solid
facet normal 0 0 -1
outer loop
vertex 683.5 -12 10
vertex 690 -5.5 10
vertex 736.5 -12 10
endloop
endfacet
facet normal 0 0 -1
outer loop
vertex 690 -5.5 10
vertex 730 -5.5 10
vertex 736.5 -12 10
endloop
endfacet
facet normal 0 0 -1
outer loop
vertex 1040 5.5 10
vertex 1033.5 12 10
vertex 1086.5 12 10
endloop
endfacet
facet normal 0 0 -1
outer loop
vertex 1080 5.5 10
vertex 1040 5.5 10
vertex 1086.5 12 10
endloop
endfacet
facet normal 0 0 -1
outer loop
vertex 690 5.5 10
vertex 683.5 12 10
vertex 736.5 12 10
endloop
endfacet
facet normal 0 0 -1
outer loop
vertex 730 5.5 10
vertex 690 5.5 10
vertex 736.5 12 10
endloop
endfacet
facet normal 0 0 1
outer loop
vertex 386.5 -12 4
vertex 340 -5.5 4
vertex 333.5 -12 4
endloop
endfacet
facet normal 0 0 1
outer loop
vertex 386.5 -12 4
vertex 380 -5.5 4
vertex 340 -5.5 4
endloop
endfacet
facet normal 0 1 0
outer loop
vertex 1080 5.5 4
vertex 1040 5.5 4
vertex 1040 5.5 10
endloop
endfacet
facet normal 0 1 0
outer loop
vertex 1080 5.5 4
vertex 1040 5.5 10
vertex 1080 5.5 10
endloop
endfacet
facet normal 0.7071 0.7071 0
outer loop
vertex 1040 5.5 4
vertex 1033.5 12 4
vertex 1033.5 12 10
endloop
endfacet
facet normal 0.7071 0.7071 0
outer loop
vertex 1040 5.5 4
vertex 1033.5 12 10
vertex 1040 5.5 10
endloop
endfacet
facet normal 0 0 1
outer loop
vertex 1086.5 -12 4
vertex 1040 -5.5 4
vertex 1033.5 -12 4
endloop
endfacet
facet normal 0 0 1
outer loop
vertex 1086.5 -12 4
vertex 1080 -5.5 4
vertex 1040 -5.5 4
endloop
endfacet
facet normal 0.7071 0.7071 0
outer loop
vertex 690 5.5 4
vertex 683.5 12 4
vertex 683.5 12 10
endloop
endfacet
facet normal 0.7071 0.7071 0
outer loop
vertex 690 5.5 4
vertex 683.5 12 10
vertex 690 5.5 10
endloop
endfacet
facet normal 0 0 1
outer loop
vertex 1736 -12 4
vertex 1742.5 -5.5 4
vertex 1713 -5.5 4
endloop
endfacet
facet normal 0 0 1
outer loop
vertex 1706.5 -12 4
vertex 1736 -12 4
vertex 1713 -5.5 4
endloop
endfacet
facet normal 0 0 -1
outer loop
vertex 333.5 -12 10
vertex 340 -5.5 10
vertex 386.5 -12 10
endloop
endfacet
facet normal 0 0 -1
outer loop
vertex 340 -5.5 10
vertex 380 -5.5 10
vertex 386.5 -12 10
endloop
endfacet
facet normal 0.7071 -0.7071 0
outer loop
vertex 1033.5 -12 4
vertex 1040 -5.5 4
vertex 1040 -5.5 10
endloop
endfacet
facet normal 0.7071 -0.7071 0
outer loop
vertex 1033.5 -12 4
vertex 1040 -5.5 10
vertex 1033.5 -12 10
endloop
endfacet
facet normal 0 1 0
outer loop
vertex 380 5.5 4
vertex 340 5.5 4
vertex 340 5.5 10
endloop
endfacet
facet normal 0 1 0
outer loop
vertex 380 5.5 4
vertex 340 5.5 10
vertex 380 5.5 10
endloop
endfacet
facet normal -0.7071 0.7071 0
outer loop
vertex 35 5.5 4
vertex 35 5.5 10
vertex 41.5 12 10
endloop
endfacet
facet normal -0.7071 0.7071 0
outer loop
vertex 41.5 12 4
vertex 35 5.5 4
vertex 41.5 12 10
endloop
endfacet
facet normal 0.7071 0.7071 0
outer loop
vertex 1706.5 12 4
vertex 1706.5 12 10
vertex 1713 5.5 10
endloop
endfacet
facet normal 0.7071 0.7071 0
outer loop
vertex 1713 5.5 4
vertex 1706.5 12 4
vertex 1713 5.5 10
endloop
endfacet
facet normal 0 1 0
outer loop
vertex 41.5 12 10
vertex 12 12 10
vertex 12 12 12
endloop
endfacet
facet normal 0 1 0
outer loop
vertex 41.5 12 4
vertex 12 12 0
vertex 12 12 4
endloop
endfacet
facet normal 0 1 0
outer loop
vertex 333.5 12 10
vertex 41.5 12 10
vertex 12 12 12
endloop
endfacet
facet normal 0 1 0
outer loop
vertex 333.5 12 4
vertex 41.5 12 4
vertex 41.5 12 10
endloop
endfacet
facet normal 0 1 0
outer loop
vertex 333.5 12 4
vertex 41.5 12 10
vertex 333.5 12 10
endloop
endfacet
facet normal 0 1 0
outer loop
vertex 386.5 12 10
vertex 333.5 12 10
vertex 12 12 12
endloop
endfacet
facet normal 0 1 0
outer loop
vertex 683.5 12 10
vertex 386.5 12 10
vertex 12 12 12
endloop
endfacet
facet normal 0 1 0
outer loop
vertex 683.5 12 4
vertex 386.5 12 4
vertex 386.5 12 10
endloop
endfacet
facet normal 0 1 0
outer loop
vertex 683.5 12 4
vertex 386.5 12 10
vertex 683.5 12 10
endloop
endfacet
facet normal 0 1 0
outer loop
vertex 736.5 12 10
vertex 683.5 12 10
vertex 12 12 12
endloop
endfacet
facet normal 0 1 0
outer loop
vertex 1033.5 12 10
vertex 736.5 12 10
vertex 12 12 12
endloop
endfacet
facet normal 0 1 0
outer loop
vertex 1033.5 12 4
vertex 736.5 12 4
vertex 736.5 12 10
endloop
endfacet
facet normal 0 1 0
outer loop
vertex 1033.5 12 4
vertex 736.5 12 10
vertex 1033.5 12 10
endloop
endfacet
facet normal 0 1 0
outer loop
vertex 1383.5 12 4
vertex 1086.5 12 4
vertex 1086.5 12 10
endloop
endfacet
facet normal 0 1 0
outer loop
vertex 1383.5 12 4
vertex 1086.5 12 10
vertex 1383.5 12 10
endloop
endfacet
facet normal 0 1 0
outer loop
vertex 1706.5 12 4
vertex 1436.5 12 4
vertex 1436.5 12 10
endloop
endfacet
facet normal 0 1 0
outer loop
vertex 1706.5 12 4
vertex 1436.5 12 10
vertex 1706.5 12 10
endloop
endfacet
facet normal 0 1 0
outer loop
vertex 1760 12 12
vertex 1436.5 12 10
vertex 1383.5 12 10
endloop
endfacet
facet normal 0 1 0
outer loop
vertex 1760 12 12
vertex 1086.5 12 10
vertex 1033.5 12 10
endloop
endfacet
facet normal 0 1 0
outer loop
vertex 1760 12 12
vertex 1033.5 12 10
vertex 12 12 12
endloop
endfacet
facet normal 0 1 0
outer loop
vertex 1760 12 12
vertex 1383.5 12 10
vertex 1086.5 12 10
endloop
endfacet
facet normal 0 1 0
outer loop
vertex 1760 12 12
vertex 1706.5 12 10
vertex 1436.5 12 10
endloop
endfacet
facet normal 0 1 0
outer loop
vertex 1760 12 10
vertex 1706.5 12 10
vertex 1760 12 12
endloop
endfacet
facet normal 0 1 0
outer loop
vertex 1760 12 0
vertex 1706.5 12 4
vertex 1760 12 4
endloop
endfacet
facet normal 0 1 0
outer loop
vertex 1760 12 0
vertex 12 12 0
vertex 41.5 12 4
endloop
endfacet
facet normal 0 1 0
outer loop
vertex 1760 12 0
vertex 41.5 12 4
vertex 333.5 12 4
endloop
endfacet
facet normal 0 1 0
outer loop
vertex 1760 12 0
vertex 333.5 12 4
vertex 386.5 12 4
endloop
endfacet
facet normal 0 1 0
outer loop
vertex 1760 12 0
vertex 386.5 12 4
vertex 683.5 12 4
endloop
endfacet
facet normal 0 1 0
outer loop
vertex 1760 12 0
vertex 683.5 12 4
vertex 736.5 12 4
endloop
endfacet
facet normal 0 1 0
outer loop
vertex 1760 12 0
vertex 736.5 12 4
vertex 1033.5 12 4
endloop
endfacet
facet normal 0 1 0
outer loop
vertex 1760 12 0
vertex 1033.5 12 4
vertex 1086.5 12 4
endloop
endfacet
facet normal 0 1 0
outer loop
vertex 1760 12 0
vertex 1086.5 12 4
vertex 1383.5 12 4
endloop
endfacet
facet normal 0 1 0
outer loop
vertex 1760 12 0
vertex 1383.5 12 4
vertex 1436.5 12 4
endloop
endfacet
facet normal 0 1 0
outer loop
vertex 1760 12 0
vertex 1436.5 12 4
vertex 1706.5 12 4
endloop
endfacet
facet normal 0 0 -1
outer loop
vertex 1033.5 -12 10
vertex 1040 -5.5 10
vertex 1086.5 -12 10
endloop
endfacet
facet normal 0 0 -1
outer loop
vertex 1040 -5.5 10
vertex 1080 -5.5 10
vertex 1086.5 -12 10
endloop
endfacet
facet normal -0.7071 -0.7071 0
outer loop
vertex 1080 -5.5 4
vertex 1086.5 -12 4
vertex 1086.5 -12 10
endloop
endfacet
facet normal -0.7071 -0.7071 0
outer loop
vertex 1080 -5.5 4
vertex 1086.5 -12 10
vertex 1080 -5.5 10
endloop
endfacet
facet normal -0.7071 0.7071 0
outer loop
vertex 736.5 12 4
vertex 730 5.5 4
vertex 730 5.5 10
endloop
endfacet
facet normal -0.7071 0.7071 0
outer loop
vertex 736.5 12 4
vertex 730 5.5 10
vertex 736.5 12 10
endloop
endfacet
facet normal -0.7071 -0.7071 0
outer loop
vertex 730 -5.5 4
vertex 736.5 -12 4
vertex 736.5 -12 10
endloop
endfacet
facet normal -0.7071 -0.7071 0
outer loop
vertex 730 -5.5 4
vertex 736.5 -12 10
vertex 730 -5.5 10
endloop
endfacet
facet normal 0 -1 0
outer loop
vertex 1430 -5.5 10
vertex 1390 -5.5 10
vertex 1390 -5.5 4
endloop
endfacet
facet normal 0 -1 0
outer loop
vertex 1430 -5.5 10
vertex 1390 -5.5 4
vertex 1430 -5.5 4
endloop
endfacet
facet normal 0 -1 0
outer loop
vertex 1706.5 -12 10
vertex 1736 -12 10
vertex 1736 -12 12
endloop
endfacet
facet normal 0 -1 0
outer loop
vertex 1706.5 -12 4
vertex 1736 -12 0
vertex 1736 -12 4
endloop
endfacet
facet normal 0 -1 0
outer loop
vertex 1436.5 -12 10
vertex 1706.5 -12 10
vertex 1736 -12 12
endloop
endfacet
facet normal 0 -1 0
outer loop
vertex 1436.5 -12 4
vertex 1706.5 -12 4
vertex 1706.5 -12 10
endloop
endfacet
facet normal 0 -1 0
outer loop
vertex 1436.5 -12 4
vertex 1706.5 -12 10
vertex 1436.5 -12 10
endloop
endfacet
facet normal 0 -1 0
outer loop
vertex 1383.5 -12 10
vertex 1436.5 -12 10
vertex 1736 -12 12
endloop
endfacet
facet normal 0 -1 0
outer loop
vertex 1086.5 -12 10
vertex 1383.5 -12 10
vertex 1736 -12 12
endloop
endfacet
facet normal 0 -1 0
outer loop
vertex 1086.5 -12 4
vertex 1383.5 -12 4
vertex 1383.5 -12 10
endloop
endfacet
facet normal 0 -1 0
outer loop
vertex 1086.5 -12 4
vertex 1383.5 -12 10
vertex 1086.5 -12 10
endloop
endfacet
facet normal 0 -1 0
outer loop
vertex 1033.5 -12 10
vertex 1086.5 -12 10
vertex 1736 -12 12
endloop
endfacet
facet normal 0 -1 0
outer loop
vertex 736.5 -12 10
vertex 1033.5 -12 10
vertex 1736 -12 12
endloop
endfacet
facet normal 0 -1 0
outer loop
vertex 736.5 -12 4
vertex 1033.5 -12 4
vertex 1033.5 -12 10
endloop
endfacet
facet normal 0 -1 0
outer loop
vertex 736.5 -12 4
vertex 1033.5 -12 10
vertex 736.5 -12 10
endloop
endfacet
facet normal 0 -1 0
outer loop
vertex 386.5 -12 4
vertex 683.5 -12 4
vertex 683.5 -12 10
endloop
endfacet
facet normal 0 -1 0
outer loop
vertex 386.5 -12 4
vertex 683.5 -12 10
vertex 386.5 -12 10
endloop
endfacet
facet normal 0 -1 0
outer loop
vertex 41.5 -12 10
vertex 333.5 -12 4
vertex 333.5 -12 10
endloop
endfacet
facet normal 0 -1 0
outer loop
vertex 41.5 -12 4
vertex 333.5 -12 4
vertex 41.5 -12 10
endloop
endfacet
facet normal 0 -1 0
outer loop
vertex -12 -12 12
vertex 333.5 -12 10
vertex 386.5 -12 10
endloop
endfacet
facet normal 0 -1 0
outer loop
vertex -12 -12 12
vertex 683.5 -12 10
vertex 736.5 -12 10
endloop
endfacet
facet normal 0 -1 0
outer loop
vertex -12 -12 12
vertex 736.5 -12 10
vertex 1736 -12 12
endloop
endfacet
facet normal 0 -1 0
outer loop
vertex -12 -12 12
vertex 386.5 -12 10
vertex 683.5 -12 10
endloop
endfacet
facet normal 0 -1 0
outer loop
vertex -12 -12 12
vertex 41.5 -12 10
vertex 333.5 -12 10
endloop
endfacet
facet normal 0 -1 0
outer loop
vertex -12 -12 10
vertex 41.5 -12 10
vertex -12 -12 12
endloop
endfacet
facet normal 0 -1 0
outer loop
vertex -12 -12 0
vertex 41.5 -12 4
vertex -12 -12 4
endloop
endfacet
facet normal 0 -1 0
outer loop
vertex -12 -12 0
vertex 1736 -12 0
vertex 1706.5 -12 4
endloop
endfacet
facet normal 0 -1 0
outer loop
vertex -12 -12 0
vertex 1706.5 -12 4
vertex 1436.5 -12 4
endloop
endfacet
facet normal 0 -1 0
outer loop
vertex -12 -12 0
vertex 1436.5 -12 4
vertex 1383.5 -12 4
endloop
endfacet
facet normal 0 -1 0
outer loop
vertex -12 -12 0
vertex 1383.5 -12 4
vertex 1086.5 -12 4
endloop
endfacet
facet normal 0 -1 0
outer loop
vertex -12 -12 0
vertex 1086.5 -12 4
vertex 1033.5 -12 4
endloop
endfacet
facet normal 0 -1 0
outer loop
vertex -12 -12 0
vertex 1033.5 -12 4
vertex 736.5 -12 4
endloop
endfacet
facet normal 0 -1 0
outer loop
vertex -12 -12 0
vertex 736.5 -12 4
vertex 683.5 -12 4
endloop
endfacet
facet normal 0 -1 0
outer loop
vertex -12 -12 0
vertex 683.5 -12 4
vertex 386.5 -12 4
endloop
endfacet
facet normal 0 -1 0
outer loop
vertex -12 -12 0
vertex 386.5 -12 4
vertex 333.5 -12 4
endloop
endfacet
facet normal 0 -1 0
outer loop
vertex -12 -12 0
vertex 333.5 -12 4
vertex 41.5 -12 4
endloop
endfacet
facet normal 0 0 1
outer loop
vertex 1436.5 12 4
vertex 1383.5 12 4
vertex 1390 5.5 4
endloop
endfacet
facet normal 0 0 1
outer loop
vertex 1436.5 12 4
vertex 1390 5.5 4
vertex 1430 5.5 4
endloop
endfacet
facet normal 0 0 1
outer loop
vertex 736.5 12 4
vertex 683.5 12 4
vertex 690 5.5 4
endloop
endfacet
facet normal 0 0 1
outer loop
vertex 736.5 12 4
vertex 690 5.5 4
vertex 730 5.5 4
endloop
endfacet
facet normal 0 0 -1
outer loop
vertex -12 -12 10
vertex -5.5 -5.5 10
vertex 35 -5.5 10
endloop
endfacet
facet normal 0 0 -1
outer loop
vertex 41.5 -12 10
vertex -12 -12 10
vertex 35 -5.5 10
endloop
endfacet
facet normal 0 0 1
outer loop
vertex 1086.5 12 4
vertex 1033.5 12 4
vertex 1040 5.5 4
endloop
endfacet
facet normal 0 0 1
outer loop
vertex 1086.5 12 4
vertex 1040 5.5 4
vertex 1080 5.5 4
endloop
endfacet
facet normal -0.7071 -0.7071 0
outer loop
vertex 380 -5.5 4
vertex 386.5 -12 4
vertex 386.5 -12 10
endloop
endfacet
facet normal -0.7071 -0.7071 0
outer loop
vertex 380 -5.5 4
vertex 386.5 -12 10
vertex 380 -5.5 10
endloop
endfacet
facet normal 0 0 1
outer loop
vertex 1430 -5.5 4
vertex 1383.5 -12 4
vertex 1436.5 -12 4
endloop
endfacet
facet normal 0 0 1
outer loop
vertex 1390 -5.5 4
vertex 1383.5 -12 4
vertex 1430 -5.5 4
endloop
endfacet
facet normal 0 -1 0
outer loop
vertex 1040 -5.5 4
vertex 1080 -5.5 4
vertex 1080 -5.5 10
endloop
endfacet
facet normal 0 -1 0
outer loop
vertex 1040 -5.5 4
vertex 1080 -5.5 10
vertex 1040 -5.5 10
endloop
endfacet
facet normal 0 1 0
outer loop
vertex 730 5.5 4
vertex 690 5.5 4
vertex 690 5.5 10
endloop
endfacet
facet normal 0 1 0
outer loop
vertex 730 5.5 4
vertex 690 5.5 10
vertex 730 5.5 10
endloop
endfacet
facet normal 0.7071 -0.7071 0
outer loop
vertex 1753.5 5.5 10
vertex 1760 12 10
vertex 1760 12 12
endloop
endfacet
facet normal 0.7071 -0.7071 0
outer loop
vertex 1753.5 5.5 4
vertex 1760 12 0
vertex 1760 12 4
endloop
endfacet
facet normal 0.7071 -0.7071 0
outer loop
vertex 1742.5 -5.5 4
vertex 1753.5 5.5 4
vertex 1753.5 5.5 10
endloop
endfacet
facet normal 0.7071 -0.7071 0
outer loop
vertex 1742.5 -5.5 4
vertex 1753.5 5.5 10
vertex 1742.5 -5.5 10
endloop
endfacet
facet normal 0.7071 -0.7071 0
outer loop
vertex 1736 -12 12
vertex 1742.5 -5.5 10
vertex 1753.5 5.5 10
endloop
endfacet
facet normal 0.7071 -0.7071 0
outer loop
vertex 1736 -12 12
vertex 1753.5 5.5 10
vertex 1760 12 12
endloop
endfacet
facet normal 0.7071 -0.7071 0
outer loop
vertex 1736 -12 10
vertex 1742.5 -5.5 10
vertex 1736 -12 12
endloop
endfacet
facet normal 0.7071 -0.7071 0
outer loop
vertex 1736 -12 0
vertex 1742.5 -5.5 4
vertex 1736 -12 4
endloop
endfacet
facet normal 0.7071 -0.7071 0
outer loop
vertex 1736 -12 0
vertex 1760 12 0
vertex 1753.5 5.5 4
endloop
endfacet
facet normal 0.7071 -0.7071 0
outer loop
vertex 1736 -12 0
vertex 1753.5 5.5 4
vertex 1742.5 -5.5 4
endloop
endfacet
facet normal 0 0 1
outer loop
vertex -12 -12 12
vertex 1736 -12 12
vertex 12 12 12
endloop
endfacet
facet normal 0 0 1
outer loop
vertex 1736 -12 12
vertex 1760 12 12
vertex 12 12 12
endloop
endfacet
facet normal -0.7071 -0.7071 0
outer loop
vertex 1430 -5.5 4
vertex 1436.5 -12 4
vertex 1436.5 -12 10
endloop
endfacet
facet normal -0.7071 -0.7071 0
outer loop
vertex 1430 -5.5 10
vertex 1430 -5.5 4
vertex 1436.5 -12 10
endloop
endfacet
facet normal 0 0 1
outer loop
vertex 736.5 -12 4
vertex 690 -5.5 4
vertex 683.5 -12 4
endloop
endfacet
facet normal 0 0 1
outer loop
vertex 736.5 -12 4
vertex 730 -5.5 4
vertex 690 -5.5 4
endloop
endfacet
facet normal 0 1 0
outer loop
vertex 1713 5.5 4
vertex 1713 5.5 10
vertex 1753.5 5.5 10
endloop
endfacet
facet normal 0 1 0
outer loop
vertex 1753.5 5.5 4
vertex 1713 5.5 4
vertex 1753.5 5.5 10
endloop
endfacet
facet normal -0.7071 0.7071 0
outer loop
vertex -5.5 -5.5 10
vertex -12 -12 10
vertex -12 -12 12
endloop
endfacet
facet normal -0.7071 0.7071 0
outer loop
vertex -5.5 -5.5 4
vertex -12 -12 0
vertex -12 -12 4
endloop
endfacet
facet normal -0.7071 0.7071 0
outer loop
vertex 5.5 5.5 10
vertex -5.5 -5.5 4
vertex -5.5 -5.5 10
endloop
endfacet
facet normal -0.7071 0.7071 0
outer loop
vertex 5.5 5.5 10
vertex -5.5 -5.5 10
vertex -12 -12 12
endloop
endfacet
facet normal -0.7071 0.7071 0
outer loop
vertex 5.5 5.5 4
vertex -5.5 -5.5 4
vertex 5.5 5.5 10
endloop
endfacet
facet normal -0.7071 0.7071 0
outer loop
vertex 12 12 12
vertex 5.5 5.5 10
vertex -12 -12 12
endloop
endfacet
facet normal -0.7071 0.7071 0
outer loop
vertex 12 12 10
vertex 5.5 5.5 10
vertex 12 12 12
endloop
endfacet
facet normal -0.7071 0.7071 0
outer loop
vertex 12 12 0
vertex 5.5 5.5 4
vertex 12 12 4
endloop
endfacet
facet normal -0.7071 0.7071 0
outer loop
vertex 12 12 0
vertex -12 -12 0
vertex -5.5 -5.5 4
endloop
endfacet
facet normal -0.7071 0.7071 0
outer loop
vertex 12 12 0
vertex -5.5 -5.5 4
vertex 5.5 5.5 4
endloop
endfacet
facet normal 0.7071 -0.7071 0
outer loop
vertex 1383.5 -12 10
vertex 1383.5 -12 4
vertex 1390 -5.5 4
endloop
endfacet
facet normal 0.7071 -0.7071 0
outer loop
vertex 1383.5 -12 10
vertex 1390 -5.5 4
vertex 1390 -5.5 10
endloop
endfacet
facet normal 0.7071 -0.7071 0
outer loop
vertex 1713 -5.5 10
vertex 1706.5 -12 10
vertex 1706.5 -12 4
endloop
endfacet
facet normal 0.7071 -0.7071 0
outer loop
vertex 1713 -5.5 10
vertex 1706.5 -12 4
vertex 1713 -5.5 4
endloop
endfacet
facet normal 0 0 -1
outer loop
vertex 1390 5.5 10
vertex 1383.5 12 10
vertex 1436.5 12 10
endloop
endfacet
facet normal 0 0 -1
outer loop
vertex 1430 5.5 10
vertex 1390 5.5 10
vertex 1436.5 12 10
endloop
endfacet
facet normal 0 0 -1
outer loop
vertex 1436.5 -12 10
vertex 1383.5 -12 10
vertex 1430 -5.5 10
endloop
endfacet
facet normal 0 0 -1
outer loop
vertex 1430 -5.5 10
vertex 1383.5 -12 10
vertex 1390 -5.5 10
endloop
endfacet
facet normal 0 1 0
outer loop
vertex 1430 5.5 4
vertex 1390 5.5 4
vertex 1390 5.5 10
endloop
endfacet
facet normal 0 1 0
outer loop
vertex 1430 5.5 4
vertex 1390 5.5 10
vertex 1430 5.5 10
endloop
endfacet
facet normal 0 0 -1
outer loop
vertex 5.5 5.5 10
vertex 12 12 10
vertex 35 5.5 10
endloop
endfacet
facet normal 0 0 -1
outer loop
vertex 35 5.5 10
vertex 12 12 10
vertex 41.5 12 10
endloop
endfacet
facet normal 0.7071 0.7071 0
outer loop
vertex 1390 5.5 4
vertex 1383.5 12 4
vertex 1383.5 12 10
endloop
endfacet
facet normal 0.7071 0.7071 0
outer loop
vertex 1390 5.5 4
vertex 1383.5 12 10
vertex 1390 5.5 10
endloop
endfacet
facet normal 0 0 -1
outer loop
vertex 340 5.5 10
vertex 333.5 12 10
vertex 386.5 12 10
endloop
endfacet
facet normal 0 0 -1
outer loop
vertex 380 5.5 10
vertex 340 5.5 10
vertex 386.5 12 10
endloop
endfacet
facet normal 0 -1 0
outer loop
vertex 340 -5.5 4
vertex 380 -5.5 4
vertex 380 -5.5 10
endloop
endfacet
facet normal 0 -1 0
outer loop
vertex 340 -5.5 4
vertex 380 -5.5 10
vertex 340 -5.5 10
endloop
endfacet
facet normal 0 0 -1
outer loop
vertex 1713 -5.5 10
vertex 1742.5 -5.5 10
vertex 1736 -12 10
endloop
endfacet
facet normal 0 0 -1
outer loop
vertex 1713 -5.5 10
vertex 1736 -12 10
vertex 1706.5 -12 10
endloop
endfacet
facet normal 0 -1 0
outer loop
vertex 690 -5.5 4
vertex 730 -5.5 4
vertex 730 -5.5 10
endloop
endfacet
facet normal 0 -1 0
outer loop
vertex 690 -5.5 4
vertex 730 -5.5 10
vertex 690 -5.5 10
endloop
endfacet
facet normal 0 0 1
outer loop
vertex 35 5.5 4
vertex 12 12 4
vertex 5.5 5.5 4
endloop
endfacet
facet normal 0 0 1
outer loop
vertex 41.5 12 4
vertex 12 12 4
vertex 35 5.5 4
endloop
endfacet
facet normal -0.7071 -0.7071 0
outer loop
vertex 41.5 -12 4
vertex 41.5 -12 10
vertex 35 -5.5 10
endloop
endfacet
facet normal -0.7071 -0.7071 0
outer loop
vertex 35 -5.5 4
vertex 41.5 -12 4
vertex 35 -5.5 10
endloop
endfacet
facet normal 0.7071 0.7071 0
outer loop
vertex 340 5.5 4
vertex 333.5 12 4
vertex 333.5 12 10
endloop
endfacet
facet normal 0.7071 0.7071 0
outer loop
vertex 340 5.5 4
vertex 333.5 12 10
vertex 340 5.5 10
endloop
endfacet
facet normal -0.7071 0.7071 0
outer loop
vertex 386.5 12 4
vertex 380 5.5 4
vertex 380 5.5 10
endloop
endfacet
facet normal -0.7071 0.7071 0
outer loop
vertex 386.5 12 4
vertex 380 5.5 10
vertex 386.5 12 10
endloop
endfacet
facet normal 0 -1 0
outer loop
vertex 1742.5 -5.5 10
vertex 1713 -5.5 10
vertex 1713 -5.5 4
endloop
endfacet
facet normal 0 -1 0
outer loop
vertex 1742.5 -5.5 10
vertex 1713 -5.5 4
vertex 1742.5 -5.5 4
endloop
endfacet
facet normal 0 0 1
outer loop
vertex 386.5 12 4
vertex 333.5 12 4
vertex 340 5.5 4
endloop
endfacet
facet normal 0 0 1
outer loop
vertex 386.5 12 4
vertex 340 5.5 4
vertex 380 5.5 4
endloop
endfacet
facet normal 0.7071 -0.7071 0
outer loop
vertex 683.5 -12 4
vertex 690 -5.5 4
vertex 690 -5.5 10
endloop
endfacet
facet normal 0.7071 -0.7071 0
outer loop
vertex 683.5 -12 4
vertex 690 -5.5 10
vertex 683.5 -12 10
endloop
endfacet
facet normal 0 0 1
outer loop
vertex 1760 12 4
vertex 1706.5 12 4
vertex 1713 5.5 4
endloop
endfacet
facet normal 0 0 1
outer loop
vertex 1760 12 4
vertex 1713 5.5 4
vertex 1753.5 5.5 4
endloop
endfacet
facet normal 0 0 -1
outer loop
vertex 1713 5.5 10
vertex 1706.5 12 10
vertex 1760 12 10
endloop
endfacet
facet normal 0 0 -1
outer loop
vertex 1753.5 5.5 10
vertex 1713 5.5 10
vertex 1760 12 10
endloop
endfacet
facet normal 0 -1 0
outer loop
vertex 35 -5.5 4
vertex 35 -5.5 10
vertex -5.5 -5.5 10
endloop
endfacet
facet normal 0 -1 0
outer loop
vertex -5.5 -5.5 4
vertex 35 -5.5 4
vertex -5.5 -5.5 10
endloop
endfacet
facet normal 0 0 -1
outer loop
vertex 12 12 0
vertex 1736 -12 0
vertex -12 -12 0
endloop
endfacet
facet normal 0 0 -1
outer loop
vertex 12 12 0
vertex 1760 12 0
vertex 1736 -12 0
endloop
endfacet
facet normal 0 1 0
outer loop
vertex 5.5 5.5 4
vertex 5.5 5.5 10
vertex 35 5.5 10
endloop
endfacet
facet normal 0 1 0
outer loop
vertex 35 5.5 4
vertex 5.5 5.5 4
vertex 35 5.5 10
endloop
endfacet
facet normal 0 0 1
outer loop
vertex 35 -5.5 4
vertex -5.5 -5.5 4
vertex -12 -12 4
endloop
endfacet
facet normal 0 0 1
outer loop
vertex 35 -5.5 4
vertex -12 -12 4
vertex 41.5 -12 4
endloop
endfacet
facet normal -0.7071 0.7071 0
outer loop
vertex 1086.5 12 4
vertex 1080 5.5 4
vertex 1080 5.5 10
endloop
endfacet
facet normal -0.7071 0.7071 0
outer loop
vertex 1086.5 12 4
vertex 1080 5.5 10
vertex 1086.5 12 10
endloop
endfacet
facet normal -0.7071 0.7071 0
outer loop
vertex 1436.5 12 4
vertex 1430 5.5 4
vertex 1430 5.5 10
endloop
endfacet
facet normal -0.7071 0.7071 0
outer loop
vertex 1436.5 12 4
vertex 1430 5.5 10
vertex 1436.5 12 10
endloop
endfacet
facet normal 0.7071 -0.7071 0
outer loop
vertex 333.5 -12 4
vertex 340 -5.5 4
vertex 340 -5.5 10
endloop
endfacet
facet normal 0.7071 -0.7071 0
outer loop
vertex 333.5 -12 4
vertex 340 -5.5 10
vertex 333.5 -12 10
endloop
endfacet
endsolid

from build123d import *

# Parameters (mm, degrees)
EXTRUDE_1_DEPTH        = 12
SKETCH_2_W             = 40
SKETCH_2_H             = 6
CUT_EXTRUDE_1_DEPTH    = 6.5
DRAFT_1_ANGLE          = 45
MIRROR_START           = 4
MIRROR_1_DEPTH         = 6
PATTERN_START          = 4
PATTERN_LINEAR_2_DEPTH = 6
CUT_EXTRUDE_START      = -2
CUT_EXTRUDE_2_DEPTH    = 6


# Read off the part's stored shape, not the designer's step: 镜向1, 阵列(线性)2
with BuildPart() as part:
    # 草图1 → 凸台-拉伸1 (new body)
    with BuildSketch(Plane.XY):
        Polygon((-12, -12), (12, 12), (1760, 12), (1736, -12), align=None)
    extrude(amount=EXTRUDE_1_DEPTH)

    # 草图2 → 切除-拉伸1 (cut)
    with BuildSketch(Plane.XZ.offset(12)):
        with Locations((1410, 7)):
            Rectangle(SKETCH_2_W, SKETCH_2_H)
    extrude(amount=-CUT_EXTRUDE_1_DEPTH, mode=Mode.SUBTRACT)

    # 拔模1
    draft_1_faces = [part.faces().sort_by_distance(p)[0] for p in [
        (1430, -8.75, 7),
        (1390, -8.75, 7),
    ]]
    draft(draft_1_faces, Plane(origin=(0, -5.5, 0), x_dir=(-1, 0, 0), z_dir=(0, -1, 0)), DRAFT_1_ANGLE)

    # 镜向1 outline → 镜向1 (cut)
    with BuildSketch(Plane.XY.offset(MIRROR_START)):
        Polygon((1390, 5.5), (1430, 5.5), (1436.5, 12), (1383.5, 12), align=None)
    extrude(amount=MIRROR_1_DEPTH, mode=Mode.SUBTRACT)

    # 阵列(线性)2 outline → 阵列(线性)2 (cut)
    with BuildSketch(Plane.XY.offset(PATTERN_START)):
        Polygon((1086.5, 12), (1033.5, 12), (1040, 5.5), (1080, 5.5), align=None)
        Polygon((736.5, 12), (683.5, 12), (690, 5.5), (730, 5.5), align=None)
        Polygon((333.5, 12), (340, 5.5), (380, 5.5), (386.5, 12), align=None)
        Polygon((1040, -5.5), (1033.5, -12), (1086.5, -12), (1080, -5.5), align=None)
        Polygon((690, -5.5), (683.5, -12), (736.5, -12), (730, -5.5), align=None)
        Polygon((340, -5.5), (333.5, -12), (386.5, -12), (380, -5.5), align=None)
    extrude(amount=PATTERN_LINEAR_2_DEPTH, mode=Mode.SUBTRACT)

    # 草图3 → 切除-拉伸2 (cut)
    with BuildSketch(Plane.XY.offset(12).offset(CUT_EXTRUDE_START)):
        Polygon((1706.5, 12), (1713, 5.5), (1753.5, 5.5), (1760, 12), align=None)
        Polygon((1706.5, -12), (1713, -5.5), (1742.5, -5.5), (1736, -12), align=None)
        Polygon((12, 12), (5.5, 5.5), (35, 5.5), (41.5, 12), align=None)
        Polygon((41.5, -12), (35, -5.5), (-5.5, -5.5), (-12, -12), align=None)
    extrude(amount=-CUT_EXTRUDE_2_DEPTH, mode=Mode.SUBTRACT)


solid = part.part
